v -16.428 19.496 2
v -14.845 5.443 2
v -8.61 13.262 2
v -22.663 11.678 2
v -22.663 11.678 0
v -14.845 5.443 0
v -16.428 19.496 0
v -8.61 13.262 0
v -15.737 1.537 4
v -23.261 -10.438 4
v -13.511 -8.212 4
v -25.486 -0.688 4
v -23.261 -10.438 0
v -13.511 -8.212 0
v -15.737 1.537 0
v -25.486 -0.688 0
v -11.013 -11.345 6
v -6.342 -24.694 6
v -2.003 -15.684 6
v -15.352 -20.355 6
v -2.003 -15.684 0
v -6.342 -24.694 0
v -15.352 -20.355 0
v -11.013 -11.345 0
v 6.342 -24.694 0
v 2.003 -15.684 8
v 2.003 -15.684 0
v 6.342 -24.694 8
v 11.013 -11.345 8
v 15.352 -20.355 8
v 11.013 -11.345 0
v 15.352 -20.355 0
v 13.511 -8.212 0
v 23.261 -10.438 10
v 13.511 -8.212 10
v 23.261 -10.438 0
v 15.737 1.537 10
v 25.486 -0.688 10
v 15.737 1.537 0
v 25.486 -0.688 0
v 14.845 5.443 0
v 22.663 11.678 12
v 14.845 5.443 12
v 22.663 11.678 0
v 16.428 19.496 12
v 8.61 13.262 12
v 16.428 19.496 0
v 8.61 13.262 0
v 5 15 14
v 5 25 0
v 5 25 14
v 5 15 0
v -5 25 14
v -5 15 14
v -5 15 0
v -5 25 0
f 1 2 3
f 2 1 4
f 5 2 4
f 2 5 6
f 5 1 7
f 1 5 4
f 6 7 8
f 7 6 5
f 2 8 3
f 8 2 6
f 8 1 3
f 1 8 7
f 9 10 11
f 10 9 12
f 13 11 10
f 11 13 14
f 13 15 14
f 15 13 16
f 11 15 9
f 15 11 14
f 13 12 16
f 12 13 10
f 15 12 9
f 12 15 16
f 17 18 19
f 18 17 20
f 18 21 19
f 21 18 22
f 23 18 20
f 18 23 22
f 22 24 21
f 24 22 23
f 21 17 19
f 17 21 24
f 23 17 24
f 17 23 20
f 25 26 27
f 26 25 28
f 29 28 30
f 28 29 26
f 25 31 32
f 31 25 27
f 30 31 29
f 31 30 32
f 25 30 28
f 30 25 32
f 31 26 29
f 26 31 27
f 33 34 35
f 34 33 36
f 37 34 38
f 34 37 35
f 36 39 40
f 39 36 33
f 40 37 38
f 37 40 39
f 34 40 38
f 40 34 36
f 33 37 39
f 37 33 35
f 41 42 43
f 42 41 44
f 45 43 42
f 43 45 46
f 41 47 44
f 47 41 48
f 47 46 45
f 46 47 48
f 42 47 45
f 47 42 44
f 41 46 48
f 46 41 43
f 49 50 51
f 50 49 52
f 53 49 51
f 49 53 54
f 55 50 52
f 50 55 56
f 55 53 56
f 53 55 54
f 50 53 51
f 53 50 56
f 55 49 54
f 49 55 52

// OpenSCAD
// OpenSCAD operators: translate and rotate
// Moves an child in the current reference frame

sides = 7;

for (i=[1:sides])
{
	rotate([0,0,i*360/sides])
	translate([-5,15,0])
	cube([10,10,i*2]);
}

// ground reference
%translate([0,0,-1/2]) cube([100,100,1], center=true);
%translate([0,25,0]) cube([1,50,1], center=true);
